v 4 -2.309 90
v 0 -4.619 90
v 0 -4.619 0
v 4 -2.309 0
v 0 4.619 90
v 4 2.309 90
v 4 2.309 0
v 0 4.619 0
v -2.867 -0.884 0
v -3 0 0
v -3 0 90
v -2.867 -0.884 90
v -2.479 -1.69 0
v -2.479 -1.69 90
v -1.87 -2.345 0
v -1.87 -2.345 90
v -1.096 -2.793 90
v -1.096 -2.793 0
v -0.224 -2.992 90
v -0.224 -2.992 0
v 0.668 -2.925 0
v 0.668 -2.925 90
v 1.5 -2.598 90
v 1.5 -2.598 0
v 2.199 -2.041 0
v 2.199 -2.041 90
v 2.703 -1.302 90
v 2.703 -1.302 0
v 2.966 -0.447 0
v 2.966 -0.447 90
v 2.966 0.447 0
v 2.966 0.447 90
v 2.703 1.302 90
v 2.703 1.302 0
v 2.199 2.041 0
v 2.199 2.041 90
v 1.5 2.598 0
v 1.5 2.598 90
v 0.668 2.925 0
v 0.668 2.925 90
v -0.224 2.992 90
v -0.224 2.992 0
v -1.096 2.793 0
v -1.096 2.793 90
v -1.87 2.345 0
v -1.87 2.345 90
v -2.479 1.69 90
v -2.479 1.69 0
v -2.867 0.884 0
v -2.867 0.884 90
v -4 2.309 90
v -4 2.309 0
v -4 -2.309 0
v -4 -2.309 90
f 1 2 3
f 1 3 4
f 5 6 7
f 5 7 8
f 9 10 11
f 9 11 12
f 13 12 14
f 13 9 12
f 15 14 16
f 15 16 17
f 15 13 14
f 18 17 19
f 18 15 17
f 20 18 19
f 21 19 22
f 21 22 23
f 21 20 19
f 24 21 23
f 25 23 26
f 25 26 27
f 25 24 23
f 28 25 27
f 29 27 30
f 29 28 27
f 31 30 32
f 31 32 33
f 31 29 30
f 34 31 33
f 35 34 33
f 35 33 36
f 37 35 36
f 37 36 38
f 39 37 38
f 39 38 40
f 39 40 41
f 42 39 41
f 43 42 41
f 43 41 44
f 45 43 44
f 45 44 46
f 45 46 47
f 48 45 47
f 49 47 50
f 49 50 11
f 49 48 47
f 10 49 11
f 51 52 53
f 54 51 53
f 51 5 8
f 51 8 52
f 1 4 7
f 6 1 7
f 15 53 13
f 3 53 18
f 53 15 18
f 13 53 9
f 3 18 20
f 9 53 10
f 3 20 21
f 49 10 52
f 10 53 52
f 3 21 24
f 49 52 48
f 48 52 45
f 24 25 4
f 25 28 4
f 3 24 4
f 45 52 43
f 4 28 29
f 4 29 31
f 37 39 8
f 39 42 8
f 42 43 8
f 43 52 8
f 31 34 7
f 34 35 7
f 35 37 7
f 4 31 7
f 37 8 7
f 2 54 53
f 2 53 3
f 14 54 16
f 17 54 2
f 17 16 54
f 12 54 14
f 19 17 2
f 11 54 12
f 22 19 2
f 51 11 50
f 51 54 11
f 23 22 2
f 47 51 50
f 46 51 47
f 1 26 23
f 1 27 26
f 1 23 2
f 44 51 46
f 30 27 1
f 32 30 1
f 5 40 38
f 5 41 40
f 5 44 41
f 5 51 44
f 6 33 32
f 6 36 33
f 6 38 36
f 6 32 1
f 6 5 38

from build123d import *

# Parameters (mm, degrees)
SKETCH_1_R      = 4
SKETCH_1_R_2    = 3
EXTRUDE_1_DEPTH = 90
EXTRUDE_START   = -90
SKETCH_2_R      = 3
EXTRUDE_2_DEPTH = 90


with BuildPart() as part:
    # 草图1 → 凸台-拉伸1 (new body)
    with BuildSketch(Plane.XY):
        with Locations(Location((0, 0, 0), (0, 0, 180))):
            Circle(SKETCH_1_R)
        with Locations(Location((0, 0, 0), (0, 0, 180))):
            Circle(SKETCH_1_R_2, mode=Mode.SUBTRACT)
    extrude(amount=EXTRUDE_1_DEPTH)

    # 草图2 → 凸台-拉伸2 (add)
    with BuildSketch(Plane.XY.offset(90).offset(EXTRUDE_START)):
        Polygon((4, 2.309401077), (0, 4.618802154), (-4, 2.309401077), (-4, -2.309401077), (0, -4.618802154), (4, -2.309401077), align=None)
        with Locations(Location((0, 0, 0), (0, 0, 180))):
            Circle(SKETCH_2_R, mode=Mode.SUBTRACT)
    extrude(amount=EXTRUDE_2_DEPTH)


solid = part.part
